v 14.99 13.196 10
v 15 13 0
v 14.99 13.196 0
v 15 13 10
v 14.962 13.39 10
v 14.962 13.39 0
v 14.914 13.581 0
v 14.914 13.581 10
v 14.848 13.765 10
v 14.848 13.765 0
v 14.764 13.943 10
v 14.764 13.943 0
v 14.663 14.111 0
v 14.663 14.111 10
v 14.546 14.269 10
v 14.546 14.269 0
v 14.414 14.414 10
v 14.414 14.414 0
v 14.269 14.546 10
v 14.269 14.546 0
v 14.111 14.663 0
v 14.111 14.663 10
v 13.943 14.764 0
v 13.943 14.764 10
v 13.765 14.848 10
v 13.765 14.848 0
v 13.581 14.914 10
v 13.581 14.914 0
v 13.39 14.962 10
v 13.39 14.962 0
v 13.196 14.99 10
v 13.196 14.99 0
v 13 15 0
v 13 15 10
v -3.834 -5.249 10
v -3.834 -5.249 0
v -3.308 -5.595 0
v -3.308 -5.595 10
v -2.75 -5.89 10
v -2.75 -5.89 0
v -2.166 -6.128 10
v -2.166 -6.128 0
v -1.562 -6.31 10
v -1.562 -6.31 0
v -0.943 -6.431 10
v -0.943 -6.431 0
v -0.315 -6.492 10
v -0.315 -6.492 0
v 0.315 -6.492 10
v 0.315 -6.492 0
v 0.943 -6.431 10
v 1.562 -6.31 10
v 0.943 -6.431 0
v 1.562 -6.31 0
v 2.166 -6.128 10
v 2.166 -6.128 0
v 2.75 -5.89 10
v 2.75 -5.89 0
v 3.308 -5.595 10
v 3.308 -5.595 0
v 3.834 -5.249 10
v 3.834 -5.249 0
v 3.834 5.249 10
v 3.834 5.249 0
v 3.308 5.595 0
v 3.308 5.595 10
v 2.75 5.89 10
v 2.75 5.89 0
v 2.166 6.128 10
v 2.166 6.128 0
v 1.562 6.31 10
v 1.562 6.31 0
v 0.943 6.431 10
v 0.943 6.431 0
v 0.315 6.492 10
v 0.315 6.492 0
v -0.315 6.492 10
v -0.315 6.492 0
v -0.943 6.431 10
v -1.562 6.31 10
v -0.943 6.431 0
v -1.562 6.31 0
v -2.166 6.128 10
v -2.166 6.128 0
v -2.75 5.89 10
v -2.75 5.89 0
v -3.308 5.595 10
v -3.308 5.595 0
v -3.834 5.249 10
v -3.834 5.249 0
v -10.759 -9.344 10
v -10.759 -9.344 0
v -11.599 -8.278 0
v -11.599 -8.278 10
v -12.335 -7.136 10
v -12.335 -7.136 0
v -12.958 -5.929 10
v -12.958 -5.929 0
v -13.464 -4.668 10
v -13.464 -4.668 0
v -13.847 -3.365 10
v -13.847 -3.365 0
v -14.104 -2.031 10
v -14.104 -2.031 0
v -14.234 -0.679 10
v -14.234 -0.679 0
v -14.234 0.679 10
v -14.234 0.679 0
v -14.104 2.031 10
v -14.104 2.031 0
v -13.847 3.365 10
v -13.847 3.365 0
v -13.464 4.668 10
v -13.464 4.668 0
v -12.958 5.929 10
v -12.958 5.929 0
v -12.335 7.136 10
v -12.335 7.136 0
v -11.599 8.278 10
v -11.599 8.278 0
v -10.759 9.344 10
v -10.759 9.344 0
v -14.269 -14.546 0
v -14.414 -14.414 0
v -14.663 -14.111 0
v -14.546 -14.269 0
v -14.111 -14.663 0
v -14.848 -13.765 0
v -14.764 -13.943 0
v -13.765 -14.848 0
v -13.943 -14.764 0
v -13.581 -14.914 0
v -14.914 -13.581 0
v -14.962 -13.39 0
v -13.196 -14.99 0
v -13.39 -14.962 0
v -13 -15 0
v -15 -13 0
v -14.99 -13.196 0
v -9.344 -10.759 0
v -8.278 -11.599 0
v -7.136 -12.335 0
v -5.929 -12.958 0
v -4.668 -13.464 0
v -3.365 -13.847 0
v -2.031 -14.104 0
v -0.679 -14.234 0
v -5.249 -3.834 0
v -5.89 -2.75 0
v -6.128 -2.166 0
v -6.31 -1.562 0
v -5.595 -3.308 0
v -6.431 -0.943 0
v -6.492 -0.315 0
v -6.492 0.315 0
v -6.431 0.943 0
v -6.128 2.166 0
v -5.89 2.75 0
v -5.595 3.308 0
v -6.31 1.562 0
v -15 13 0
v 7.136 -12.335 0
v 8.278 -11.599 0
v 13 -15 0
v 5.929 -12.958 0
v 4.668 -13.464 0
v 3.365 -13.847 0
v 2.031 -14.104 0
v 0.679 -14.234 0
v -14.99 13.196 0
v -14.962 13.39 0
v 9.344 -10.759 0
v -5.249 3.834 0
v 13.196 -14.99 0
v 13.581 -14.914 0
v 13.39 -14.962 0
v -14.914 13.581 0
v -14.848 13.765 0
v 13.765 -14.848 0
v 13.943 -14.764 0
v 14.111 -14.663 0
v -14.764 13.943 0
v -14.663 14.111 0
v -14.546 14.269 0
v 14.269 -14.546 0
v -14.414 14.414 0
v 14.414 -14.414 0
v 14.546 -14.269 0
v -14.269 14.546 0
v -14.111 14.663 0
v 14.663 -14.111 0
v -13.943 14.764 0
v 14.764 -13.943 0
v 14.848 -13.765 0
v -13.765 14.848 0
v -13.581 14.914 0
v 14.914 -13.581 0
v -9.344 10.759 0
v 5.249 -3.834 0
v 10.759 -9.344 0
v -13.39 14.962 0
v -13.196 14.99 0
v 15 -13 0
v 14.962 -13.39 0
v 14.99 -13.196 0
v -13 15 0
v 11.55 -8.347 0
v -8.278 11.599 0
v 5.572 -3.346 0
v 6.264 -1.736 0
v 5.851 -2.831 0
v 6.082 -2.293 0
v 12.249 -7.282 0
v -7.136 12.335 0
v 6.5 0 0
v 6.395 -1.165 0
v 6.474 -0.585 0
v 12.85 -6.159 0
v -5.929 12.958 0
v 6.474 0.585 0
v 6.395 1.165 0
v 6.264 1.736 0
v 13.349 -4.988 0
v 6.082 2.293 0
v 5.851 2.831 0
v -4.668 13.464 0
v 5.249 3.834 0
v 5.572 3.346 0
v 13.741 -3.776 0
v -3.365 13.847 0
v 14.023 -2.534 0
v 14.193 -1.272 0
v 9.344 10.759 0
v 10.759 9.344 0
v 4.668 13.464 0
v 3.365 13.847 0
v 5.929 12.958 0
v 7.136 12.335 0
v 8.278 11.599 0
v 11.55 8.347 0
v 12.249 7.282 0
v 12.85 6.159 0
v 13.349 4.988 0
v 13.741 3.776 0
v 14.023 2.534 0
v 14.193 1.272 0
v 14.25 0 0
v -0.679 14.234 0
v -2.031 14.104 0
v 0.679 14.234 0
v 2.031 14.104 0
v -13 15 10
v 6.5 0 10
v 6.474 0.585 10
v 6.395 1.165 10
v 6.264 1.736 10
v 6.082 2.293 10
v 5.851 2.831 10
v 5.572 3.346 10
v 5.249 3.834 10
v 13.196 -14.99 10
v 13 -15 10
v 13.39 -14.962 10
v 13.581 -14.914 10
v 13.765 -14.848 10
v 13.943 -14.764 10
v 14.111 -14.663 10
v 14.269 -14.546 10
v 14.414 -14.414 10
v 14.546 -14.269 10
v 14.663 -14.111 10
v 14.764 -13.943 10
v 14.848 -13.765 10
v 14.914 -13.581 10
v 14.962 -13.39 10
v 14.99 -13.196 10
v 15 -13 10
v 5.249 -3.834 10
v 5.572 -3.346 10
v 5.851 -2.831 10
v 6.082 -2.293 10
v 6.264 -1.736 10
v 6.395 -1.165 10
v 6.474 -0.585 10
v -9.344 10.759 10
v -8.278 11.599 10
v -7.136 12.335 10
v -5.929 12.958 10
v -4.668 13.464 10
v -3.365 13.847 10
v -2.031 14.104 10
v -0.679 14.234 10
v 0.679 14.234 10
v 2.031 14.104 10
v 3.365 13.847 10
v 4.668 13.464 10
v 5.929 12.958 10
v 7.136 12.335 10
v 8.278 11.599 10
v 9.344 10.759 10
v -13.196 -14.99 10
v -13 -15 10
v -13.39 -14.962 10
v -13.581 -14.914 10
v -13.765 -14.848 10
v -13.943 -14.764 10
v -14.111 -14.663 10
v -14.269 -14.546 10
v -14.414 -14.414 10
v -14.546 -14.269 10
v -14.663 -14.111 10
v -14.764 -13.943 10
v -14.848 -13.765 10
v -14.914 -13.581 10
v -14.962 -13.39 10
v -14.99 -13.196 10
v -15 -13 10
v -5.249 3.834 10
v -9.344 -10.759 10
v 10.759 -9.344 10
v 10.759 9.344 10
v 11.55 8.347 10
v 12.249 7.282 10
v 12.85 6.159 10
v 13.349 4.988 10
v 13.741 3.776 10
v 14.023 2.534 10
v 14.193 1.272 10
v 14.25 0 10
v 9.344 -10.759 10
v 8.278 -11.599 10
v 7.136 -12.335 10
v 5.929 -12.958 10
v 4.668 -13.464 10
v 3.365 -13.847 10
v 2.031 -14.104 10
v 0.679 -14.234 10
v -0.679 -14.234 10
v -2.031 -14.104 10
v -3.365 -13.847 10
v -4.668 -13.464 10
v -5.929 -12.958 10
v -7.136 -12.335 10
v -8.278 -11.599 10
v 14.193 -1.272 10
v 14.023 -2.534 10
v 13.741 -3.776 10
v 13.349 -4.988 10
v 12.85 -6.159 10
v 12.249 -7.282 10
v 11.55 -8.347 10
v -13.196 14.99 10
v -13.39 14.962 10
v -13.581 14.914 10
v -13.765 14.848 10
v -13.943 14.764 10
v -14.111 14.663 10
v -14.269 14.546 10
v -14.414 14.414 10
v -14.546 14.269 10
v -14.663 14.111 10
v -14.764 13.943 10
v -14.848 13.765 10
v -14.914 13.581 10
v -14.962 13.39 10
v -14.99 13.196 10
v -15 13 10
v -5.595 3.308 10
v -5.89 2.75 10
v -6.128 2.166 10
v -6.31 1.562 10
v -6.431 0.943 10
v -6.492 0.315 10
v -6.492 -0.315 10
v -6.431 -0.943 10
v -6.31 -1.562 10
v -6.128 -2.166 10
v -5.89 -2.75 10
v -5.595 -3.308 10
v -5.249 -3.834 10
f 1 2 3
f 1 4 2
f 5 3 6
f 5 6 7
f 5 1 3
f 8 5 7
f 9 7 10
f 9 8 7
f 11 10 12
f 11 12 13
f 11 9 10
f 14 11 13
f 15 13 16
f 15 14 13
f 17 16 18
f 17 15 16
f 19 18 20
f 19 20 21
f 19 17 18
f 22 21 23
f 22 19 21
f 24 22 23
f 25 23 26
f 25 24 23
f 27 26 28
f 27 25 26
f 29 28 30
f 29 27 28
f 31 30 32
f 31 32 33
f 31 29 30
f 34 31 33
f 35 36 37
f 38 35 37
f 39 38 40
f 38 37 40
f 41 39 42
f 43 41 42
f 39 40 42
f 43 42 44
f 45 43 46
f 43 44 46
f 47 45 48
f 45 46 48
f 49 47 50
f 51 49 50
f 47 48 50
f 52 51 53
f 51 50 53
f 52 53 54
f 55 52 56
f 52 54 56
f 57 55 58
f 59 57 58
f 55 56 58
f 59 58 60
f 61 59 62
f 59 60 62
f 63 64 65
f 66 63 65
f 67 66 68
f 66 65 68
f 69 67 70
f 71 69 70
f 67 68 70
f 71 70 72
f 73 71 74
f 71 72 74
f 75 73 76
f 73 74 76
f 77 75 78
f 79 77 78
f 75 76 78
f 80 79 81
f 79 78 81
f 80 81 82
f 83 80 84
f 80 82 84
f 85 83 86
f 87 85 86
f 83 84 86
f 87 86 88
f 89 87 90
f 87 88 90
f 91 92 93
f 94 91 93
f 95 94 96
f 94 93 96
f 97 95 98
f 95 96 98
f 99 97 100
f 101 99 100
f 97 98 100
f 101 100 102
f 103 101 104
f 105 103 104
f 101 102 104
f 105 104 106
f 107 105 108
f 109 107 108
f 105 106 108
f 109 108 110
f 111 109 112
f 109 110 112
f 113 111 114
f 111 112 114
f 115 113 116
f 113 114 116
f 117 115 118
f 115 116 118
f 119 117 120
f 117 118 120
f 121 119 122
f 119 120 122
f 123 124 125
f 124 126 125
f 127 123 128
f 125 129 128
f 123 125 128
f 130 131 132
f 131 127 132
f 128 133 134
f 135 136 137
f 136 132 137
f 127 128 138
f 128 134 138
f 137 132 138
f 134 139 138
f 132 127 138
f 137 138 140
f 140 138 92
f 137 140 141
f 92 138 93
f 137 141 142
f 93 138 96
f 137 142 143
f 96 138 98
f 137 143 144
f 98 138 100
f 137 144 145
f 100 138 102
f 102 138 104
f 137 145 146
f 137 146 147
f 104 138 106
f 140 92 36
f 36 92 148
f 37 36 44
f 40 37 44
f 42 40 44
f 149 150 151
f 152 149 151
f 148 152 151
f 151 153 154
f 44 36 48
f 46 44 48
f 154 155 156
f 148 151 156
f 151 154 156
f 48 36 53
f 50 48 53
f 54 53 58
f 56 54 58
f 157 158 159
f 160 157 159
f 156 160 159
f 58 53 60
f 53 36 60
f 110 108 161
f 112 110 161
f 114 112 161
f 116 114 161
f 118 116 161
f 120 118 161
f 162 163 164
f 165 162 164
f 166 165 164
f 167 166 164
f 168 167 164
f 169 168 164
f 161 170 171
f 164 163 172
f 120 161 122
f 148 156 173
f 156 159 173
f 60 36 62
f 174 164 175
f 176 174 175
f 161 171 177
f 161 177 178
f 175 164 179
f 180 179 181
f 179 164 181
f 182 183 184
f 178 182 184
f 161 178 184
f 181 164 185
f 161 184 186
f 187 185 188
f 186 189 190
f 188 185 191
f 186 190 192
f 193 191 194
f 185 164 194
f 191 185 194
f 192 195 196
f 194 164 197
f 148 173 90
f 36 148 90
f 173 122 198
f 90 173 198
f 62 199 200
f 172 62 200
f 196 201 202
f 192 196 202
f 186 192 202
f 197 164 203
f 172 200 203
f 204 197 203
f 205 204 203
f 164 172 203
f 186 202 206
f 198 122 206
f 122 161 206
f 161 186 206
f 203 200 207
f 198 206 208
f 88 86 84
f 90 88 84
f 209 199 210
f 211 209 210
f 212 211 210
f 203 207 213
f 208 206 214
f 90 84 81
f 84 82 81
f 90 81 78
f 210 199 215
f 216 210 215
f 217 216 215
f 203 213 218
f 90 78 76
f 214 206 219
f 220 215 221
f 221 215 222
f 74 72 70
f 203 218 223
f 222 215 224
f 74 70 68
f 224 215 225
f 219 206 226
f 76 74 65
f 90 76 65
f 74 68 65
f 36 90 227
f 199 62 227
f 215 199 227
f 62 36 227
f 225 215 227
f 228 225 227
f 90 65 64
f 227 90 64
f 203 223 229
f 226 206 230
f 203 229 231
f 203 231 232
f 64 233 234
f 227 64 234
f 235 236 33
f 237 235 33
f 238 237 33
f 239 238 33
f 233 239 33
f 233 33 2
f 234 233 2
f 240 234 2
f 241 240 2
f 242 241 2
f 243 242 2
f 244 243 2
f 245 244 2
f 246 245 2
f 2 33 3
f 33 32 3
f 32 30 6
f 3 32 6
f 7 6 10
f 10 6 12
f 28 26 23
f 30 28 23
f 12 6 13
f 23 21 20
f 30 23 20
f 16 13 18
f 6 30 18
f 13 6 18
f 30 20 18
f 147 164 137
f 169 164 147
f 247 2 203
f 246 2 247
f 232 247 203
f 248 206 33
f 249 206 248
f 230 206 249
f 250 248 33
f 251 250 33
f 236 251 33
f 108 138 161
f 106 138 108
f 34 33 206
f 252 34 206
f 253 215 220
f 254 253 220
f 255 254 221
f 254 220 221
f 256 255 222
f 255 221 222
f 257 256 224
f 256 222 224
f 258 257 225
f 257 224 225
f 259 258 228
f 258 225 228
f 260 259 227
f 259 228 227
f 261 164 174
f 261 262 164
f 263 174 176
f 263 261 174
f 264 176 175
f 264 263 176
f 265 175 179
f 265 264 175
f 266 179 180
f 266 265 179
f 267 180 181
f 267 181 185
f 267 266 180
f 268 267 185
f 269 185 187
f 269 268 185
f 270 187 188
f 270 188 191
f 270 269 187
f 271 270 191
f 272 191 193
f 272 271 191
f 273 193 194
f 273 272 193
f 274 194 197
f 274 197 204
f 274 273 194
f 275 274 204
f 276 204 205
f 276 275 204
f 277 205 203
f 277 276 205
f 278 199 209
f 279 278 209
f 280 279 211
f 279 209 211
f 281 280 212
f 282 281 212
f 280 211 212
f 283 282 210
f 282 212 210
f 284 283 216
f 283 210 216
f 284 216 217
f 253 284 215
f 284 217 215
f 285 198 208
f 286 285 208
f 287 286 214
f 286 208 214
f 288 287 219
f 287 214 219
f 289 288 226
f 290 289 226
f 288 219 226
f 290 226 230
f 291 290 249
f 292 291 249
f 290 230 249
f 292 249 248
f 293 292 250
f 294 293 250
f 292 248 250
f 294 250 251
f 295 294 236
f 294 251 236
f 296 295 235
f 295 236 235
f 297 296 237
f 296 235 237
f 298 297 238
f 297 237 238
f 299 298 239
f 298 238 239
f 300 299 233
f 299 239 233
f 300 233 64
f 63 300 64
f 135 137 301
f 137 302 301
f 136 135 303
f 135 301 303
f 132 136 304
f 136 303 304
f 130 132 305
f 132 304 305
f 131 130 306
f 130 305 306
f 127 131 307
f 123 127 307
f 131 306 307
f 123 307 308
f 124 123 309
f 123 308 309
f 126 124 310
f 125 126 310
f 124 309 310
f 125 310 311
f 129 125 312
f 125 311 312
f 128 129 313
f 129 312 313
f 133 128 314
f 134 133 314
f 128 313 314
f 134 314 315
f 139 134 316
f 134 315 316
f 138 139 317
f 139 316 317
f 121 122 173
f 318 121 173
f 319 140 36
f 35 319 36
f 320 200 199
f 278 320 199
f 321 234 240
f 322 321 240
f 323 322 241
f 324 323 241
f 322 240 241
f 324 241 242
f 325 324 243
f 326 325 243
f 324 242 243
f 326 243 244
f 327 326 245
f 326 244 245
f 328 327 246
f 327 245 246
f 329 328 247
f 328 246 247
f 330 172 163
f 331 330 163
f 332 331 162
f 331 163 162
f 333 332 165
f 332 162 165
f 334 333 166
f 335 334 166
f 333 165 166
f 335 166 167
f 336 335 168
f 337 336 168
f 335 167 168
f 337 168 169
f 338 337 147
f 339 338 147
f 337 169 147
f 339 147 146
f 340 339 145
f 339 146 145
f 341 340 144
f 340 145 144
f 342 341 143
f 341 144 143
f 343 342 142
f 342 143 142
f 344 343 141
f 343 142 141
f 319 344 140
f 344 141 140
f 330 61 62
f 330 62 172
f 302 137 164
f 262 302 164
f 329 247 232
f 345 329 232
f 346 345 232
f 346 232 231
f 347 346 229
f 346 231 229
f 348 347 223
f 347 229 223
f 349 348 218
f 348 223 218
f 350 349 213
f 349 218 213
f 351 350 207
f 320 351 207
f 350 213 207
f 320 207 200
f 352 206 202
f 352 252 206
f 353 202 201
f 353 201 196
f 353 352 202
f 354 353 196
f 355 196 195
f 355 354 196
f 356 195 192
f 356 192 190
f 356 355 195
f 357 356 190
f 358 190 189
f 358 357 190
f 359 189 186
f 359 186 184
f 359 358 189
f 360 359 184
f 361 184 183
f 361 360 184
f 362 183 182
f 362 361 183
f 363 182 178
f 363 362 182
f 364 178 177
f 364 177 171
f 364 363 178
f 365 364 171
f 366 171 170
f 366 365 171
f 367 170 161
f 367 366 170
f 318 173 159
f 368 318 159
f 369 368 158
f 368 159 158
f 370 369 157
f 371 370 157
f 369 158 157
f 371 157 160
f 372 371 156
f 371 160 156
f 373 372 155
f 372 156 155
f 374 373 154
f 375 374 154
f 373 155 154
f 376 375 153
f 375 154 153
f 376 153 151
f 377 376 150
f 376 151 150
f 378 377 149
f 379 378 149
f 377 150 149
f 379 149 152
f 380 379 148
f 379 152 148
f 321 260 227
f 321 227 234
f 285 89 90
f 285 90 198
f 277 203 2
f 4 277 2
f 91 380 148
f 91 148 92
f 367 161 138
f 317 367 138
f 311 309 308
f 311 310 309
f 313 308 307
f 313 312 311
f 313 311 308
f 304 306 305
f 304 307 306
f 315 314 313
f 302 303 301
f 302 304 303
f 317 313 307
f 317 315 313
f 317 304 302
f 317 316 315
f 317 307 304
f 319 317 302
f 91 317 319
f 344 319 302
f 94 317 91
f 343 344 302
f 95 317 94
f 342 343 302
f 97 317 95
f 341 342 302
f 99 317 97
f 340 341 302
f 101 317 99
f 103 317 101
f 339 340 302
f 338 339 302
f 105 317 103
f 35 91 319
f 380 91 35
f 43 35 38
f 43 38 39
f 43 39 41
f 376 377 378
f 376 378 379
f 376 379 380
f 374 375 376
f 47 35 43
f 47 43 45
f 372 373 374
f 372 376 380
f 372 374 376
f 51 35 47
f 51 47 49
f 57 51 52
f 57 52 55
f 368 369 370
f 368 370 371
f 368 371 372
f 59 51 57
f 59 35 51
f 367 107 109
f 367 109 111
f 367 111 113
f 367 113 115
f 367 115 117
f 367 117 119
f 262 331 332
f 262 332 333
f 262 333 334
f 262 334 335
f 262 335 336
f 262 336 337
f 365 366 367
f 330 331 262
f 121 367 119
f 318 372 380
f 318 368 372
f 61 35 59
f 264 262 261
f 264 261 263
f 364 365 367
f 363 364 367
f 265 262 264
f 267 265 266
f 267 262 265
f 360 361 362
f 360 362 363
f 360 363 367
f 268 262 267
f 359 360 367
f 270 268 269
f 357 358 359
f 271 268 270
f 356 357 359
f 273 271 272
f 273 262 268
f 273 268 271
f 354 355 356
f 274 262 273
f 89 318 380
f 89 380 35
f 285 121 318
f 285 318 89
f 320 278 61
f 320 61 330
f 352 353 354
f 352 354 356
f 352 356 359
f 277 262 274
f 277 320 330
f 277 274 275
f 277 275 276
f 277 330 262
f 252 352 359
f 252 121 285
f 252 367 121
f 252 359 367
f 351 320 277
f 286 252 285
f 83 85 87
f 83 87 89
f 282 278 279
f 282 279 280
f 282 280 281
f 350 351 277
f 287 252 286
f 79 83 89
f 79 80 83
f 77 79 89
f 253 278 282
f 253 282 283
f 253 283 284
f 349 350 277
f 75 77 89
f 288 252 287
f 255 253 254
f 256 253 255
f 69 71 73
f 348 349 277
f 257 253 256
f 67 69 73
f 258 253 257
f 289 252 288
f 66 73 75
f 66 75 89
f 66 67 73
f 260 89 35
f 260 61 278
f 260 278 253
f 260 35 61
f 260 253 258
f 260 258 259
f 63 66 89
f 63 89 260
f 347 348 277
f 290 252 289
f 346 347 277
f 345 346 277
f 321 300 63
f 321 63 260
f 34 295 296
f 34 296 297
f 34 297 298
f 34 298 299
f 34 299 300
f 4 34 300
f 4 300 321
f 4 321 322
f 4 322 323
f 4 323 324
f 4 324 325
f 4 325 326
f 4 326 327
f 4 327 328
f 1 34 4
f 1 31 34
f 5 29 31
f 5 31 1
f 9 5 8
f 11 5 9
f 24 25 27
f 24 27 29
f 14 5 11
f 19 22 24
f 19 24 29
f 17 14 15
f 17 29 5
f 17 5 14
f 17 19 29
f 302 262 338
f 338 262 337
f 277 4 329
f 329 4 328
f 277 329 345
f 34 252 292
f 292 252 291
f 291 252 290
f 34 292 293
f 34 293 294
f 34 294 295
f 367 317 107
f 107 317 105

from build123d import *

# Parameters (mm, degrees)
BOSS_EXTRUDE1_DEPTH = 10
FILLET1_R           = 2


with BuildPart() as part:
    # Sketch1 → Boss-Extrude1 (new body)
    with BuildSketch(Plane.XY):
        with BuildLine():
            ThreePointArc((-10.758537028, -9.344323465), (-14.25, 0), (-10.758537028, 9.344323465))
            Line((-10.758537028, 9.344323465), (-15, 13.585786438))
            Line((-15, 13.585786438), (-15, -13.585786438))
            Line((-15, -13.585786438), (-10.758537028, -9.344323465))
        make_face()
        with BuildLine():
            ThreePointArc((-9.344323465, -10.758537028), (-10.076271632, -10.076271632), (-10.758537028, -9.344323465))
            Line((-10.758537028, -9.344323465), (-15, -13.585786438))
            Line((-15, -13.585786438), (-15, -15))
            Line((-15, -15), (-13.585786438, -15))
            Line((-13.585786438, -15), (-9.344323465, -10.758537028))
        make_face()
        with BuildLine():
            ThreePointArc((9.344323465, -10.758537028), (0, -14.25), (-9.344323465, -10.758537028))
            Line((-9.344323465, -10.758537028), (-13.585786438, -15))
            Line((-13.585786438, -15), (13.585786438, -15))
            Line((13.585786438, -15), (9.344323465, -10.758537028))
        make_face()
        with BuildLine():
            Line((15, -15), (15, -13.585786438))
            Line((15, -13.585786438), (10.758537028, -9.344323465))
            ThreePointArc((10.758537028, -9.344323465), (10.076271632, -10.076271632), (9.344323465, -10.758537028))
            Line((9.344323465, -10.758537028), (13.585786438, -15))
            Line((13.585786438, -15), (15, -15))
        make_face()
        with BuildLine():
            Line((15, 13.585786438), (10.758537028, 9.344323465))
            ThreePointArc((10.758537028, 9.344323465), (13.348626383, 4.987652121), (14.25, 0))
            ThreePointArc((14.25, 0), (13.348626383, -4.987652121), (10.758537028, -9.344323465))
            Line((10.758537028, -9.344323465), (15, -13.585786438))
            Line((15, -13.585786438), (15, 13.585786438))
        make_face()
        with BuildLine():
            Line((15, 15), (13.585786438, 15))
            Line((13.585786438, 15), (9.344323465, 10.758537028))
            ThreePointArc((9.344323465, 10.758537028), (10.076271632, 10.076271632), (10.758537028, 9.344323465))
            Line((10.758537028, 9.344323465), (15, 13.585786438))
            Line((15, 13.585786438), (15, 15))
        make_face()
        with BuildLine():
            Line((13.585786438, 15), (-13.585786438, 15))
            Line((-13.585786438, 15), (-9.344323465, 10.758537028))
            ThreePointArc((-9.344323465, 10.758537028), (0, 14.25), (9.344323465, 10.758537028))
            Line((9.344323465, 10.758537028), (13.585786438, 15))
        make_face()
        with BuildLine():
            Line((-9.344323465, 10.758537028), (-13.585786438, 15))
            Line((-13.585786438, 15), (-15, 15))
            Line((-15, 15), (-15, 13.585786438))
            Line((-15, 13.585786438), (-10.758537028, 9.344323465))
            ThreePointArc((-10.758537028, 9.344323465), (-10.076271632, 10.076271632), (-9.344323465, 10.758537028))
        make_face()
        with BuildLine():
            Line((3.83436875, -5.248582312), (0, -1.414213562))
            Line((0, -1.414213562), (-3.83436875, -5.248582312))
            ThreePointArc((-3.83436875, -5.248582312), (0, -6.5), (3.83436875, -5.248582312))
        make_face()
        with BuildLine():
            Line((0, -1.414213562), (-1.414213562, 0))
            Line((-1.414213562, 0), (-5.248582312, -3.83436875))
            ThreePointArc((-5.248582312, -3.83436875), (-4.596194078, -4.596194078), (-3.83436875, -5.248582312))
            Line((-3.83436875, -5.248582312), (0, -1.414213562))
        make_face()
        with BuildLine():
            Line((-1.414213562, 0), (-5.248582312, 3.83436875))
            ThreePointArc((-5.248582312, 3.83436875), (-6.5, 0), (-5.248582312, -3.83436875))
            Line((-5.248582312, -3.83436875), (-1.414213562, 0))
        make_face()
        with BuildLine():
            Line((0, 1.414213562), (-3.83436875, 5.248582312))
            ThreePointArc((-3.83436875, 5.248582312), (-4.596194078, 4.596194078), (-5.248582312, 3.83436875))
            Line((-5.248582312, 3.83436875), (-1.414213562, 0))
            Line((-1.414213562, 0), (0, 1.414213562))
        make_face()
        with BuildLine():
            ThreePointArc((3.83436875, 5.248582312), (0, 6.5), (-3.83436875, 5.248582312))
            Line((-3.83436875, 5.248582312), (0, 1.414213562))
            Line((0, 1.414213562), (3.83436875, 5.248582312))
        make_face()
        with BuildLine():
            Line((3.83436875, 5.248582312), (0, 1.414213562))
            Line((0, 1.414213562), (1.414213562, 0))
            Line((1.414213562, 0), (5.248582312, 3.83436875))
            ThreePointArc((5.248582312, 3.83436875), (4.596194078, 4.596194078), (3.83436875, 5.248582312))
        make_face()
        with BuildLine():
            Line((5.248582312, 3.83436875), (1.414213562, 0))
            Line((1.414213562, 0), (5.248582312, -3.83436875))
            ThreePointArc((5.248582312, -3.83436875), (6.179230738, -2.01670709), (6.5, 0))
            ThreePointArc((6.5, 0), (6.179230738, 2.01670709), (5.248582312, 3.83436875))
        make_face()
        with BuildLine():
            Line((5.248582312, -3.83436875), (1.414213562, 0))
            Line((1.414213562, 0), (0, -1.414213562))
            Line((0, -1.414213562), (3.83436875, -5.248582312))
            ThreePointArc((3.83436875, -5.248582312), (4.596194078, -4.596194078), (5.248582312, -3.83436875))
        make_face()
        with BuildLine():
            Line((-3.83436875, 5.248582312), (-9.344323465, 10.758537028))
            ThreePointArc((-9.344323465, 10.758537028), (-10.076271632, 10.076271632), (-10.758537028, 9.344323465))
            Line((-10.758537028, 9.344323465), (-5.248582312, 3.83436875))
            ThreePointArc((-5.248582312, 3.83436875), (-4.596194078, 4.596194078), (-3.83436875, 5.248582312))
        make_face()
        with BuildLine():
            Line((10.758537028, -9.344323465), (5.248582312, -3.83436875))
            ThreePointArc((5.248582312, -3.83436875), (4.596194078, -4.596194078), (3.83436875, -5.248582312))
            Line((3.83436875, -5.248582312), (9.344323465, -10.758537028))
            ThreePointArc((9.344323465, -10.758537028), (10.076271632, -10.076271632), (10.758537028, -9.344323465))
        make_face()
        with BuildLine():
            ThreePointArc((10.758537028, 9.344323465), (10.076271632, 10.076271632), (9.344323465, 10.758537028))
            Line((9.344323465, 10.758537028), (3.83436875, 5.248582312))
            ThreePointArc((3.83436875, 5.248582312), (4.596194078, 4.596194078), (5.248582312, 3.83436875))
            Line((5.248582312, 3.83436875), (10.758537028, 9.344323465))
        make_face()
        with BuildLine():
            Line((-5.248582312, -3.83436875), (-10.758537028, -9.344323465))
            ThreePointArc((-10.758537028, -9.344323465), (-10.076271632, -10.076271632), (-9.344323465, -10.758537028))
            Line((-9.344323465, -10.758537028), (-3.83436875, -5.248582312))
            ThreePointArc((-3.83436875, -5.248582312), (-4.596194078, -4.596194078), (-5.248582312, -3.83436875))
        make_face()
        Polygon((1.414213562, 0), (0, 1.414213562), (-1.414213562, 0), (0, -1.414213562), align=None)
    extrude(amount=BOSS_EXTRUDE1_DEPTH)

    # Fillet1
    fillet1_edges = [part.edges().sort_by_distance(p)[0] for p in [
        (15, -15, 5),
        (-15, -15, 5),
        (-15, 15, 5),
        (15, 15, 5),
    ]]
    fillet(fillet1_edges, radius=FILLET1_R)


solid = part.part
